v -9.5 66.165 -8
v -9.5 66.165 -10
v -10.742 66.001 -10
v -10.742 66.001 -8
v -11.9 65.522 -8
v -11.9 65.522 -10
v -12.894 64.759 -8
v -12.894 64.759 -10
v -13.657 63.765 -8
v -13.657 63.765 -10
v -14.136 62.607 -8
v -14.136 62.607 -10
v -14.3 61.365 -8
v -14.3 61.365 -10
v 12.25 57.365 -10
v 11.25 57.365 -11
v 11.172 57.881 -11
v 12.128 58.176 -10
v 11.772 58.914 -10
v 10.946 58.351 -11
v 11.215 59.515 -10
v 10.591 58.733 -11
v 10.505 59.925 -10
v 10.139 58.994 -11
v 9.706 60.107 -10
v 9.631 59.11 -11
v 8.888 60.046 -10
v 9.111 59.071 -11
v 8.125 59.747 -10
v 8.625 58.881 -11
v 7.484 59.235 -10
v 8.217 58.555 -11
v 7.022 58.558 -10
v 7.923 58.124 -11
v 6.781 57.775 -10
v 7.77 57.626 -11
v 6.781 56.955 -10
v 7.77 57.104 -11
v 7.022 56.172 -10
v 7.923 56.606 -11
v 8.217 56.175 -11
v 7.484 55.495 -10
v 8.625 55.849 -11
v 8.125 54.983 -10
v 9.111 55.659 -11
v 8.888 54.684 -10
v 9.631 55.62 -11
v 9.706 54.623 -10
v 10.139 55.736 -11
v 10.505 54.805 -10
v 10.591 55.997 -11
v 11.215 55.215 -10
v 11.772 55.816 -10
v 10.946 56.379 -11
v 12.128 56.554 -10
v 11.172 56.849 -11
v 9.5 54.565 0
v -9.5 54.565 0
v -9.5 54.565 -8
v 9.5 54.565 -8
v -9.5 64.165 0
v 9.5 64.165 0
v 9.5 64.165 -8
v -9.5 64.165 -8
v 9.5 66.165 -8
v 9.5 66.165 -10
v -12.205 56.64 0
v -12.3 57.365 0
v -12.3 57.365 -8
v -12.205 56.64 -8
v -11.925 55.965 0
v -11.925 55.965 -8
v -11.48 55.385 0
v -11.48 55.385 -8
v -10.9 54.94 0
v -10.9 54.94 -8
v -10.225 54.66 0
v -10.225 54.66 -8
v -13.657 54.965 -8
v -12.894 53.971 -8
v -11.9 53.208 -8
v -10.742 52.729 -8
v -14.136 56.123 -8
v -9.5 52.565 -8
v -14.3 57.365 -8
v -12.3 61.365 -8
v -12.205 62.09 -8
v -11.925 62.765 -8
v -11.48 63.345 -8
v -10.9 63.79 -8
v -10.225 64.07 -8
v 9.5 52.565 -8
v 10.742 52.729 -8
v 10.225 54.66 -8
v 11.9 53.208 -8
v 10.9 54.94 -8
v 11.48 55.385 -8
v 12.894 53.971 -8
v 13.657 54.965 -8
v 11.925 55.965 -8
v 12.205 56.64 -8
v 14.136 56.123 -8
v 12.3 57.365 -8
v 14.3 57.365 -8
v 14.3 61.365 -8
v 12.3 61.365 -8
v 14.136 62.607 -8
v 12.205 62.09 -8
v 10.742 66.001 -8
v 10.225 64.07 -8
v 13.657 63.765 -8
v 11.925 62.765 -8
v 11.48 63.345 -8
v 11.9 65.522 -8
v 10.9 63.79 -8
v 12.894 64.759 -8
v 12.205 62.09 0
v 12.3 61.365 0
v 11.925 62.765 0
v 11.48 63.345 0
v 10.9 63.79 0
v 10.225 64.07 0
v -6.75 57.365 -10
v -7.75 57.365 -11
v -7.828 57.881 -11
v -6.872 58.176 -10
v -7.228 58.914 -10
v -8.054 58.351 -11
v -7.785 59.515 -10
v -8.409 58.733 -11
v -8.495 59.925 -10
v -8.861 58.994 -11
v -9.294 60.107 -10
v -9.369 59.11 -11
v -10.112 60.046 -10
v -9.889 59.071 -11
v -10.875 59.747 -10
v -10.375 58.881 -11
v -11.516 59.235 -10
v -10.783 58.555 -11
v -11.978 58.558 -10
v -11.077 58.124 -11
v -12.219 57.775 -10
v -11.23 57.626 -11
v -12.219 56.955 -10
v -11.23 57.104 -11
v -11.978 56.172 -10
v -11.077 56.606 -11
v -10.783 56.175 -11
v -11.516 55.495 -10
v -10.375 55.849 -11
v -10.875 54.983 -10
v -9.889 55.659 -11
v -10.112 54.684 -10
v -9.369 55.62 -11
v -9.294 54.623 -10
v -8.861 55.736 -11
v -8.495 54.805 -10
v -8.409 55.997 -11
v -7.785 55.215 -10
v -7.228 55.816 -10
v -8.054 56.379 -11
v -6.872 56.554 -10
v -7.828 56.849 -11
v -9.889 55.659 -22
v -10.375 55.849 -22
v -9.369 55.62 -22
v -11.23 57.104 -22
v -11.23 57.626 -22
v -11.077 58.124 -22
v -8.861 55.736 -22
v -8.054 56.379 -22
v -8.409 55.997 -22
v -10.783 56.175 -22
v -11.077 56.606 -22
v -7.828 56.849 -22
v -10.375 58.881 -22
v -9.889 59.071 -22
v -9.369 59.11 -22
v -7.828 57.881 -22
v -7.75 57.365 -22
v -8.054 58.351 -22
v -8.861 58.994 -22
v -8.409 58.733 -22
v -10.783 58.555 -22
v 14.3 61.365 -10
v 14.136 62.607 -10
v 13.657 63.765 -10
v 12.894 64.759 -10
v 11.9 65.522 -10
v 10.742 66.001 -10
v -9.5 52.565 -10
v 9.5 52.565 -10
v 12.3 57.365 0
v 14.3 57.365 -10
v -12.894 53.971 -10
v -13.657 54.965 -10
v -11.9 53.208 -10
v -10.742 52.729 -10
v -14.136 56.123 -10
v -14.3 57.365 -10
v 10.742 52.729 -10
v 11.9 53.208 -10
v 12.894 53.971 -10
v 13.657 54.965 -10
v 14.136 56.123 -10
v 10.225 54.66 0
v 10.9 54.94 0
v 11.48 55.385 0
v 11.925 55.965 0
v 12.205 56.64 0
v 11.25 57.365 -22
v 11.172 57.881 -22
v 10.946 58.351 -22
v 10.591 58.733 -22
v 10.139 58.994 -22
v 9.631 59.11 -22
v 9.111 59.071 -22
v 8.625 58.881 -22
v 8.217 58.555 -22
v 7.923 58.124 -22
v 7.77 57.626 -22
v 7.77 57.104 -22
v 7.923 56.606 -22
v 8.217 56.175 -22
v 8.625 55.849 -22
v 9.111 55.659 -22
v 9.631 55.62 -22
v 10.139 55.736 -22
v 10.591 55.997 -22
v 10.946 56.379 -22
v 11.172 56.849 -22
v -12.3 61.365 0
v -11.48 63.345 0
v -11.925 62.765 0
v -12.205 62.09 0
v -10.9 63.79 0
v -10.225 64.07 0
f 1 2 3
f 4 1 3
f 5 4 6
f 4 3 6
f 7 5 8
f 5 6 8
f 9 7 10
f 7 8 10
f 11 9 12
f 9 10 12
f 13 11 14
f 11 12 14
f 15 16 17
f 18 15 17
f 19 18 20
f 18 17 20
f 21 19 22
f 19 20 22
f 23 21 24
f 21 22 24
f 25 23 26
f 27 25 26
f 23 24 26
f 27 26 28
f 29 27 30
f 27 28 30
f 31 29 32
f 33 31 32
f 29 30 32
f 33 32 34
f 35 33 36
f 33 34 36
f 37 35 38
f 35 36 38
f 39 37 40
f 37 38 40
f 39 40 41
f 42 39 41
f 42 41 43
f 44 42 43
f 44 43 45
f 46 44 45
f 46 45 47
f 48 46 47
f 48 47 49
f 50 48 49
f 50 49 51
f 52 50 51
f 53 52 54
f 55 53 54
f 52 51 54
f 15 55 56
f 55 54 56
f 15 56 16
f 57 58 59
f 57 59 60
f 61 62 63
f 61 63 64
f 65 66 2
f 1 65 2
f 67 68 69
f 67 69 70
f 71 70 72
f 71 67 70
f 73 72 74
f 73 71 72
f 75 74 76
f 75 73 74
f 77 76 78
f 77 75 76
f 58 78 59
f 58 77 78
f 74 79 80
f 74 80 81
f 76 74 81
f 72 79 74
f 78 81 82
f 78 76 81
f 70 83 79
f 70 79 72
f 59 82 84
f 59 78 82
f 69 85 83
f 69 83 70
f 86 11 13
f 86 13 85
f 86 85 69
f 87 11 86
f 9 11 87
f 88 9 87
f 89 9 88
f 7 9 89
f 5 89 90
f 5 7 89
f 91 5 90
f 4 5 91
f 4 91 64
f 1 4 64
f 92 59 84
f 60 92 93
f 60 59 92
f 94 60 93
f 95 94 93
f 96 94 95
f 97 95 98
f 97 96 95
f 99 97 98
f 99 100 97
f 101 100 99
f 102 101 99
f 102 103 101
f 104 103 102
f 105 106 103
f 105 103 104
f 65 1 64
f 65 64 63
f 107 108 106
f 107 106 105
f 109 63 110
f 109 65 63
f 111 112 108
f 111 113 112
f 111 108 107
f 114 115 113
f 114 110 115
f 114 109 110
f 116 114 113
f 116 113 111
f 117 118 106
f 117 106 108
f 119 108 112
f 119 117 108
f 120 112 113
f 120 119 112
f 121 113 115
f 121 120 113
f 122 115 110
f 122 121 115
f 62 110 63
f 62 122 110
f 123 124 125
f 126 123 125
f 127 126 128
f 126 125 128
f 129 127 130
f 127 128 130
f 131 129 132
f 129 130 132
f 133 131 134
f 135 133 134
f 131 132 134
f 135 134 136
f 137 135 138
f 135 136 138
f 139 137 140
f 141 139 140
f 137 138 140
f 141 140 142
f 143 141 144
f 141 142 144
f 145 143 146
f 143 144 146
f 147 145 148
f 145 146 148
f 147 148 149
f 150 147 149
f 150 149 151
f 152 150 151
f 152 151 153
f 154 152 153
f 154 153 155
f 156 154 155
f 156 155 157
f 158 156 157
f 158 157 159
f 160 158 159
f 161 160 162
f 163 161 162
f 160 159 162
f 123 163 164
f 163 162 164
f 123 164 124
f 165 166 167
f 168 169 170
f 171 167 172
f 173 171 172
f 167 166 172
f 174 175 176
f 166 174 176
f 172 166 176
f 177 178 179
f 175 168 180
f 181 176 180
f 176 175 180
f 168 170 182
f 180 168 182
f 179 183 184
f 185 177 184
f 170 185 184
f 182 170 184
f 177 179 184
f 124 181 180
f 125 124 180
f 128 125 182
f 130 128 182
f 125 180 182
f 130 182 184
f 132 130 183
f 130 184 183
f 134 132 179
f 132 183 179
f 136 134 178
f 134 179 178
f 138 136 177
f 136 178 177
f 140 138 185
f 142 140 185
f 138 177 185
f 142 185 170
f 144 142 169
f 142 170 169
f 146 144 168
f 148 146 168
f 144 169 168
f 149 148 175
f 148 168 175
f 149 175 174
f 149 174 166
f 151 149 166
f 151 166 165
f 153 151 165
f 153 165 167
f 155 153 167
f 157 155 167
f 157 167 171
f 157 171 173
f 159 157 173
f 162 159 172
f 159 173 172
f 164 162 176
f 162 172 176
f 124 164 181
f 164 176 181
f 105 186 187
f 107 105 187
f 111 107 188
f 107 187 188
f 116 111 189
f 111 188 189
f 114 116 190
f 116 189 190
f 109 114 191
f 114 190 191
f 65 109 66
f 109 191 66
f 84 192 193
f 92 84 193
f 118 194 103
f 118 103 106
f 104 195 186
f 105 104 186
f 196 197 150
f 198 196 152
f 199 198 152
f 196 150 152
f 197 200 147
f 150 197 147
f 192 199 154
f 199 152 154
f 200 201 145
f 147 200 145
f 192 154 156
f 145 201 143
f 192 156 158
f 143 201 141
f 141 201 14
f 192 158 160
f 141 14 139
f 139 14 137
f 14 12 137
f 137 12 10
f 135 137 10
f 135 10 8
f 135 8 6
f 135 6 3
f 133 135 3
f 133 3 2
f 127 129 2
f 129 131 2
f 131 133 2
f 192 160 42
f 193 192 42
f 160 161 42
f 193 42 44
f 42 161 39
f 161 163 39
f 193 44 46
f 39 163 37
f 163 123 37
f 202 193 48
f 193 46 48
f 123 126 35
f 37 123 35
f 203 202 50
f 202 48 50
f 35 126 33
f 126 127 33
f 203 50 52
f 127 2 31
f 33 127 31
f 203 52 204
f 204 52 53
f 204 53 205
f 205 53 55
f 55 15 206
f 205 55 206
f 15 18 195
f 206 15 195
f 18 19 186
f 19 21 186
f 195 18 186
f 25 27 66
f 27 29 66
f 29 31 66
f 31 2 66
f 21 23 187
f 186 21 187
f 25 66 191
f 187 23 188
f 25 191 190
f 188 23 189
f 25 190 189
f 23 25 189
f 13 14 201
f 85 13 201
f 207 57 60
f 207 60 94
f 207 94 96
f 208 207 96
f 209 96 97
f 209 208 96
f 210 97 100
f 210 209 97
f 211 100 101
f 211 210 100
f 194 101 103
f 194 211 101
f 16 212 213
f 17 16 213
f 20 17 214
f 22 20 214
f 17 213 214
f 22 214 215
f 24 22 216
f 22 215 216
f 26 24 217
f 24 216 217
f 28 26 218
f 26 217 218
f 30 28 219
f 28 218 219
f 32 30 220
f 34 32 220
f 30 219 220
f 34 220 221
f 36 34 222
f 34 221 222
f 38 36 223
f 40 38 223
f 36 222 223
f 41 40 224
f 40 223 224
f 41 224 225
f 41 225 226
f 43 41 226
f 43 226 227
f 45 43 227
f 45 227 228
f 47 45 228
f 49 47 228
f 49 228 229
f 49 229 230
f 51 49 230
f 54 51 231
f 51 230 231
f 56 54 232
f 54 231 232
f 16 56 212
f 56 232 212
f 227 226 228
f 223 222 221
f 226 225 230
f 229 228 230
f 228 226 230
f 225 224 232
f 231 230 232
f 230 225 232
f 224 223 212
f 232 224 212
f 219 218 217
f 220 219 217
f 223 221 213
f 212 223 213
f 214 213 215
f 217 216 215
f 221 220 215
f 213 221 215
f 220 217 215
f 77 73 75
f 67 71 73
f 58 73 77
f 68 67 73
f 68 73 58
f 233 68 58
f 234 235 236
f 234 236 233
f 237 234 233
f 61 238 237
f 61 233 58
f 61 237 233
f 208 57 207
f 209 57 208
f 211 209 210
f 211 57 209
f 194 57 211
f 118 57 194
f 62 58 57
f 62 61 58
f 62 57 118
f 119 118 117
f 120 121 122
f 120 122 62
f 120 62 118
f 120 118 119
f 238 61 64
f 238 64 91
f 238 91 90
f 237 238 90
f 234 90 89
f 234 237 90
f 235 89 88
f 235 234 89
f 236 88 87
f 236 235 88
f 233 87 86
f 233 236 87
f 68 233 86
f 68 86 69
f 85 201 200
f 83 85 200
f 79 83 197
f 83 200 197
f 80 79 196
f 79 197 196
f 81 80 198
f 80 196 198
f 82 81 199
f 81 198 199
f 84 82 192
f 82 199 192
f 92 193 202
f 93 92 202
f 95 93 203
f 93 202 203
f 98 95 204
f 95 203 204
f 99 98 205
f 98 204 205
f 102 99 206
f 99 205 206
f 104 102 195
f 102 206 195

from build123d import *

# Parameters (mm, degrees)
BOSS_EXTRUDE1_DEPTH = 10
BOSS_EXTRUDE2_START = -10
BOSS_EXTRUDE2_DEPTH = 2
BOSS_EXTRUDE3_START = -22
SKETCH3_R           = 1.75
BOSS_EXTRUDE3_DEPTH = 12
CHAMFER1_SIZE       = 1


with BuildPart() as part:
    # Sketch1 → Boss-Extrude1 (new body)
    with BuildSketch(Plane.XY):
        with BuildLine():
            Line((12.3, 57.365), (12.3, 61.365))
            ThreePointArc((12.3, 61.365), (11.479898987, 63.344898987), (9.5, 64.165))
            Line((9.5, 64.165), (-9.5, 64.165))
            ThreePointArc((-9.5, 64.165), (-11.479898987, 63.344898987), (-12.3, 61.365))
            Line((-12.3, 61.365), (-12.3, 57.365))
            ThreePointArc((-12.3, 57.365), (-11.479898987, 55.385101013), (-9.5, 54.565))
            Line((-9.5, 54.565), (9.5, 54.565))
            ThreePointArc((9.5, 54.565), (11.479898987, 55.385101013), (12.3, 57.365))
        make_face()
    extrude(amount=-BOSS_EXTRUDE1_DEPTH)

    # Sketch2 → Boss-Extrude2 (add)
    with BuildSketch(Plane.XY.offset(BOSS_EXTRUDE2_START)):
        with BuildLine():
            Line((14.3, 57.365), (14.3, 61.365))
            ThreePointArc((14.3, 61.365), (12.89411255, 64.75911255), (9.5, 66.165))
            Line((9.5, 66.165), (-9.5, 66.165))
            ThreePointArc((-9.5, 66.165), (-12.89411255, 64.75911255), (-14.3, 61.365))
            Line((-14.3, 61.365), (-14.3, 57.365))
            ThreePointArc((-14.3, 57.365), (-12.89411255, 53.97088745), (-9.5, 52.565))
            Line((-9.5, 52.565), (9.5, 52.565))
            ThreePointArc((9.5, 52.565), (12.89411255, 53.97088745), (14.3, 57.365))
        make_face()
    extrude(amount=BOSS_EXTRUDE2_DEPTH)

    # Sketch3 → Boss-Extrude3 (add)
    with BuildSketch(Plane.XY.offset(BOSS_EXTRUDE3_START)):
        with Locations((9.5, 57.365)):
            Circle(SKETCH3_R)
        with Locations((-9.5, 57.365)):
            Circle(SKETCH3_R)
    extrude(amount=BOSS_EXTRUDE3_DEPTH)

    # Chamfer1
    chamfer1_edges = [part.edges().sort_by_distance(p)[0] for p in [
        (7.75, 57.365, -10),
        (-11.25, 57.365, -10),
    ]]
    chamfer(chamfer1_edges, length=CHAMFER1_SIZE)


solid = part.part
